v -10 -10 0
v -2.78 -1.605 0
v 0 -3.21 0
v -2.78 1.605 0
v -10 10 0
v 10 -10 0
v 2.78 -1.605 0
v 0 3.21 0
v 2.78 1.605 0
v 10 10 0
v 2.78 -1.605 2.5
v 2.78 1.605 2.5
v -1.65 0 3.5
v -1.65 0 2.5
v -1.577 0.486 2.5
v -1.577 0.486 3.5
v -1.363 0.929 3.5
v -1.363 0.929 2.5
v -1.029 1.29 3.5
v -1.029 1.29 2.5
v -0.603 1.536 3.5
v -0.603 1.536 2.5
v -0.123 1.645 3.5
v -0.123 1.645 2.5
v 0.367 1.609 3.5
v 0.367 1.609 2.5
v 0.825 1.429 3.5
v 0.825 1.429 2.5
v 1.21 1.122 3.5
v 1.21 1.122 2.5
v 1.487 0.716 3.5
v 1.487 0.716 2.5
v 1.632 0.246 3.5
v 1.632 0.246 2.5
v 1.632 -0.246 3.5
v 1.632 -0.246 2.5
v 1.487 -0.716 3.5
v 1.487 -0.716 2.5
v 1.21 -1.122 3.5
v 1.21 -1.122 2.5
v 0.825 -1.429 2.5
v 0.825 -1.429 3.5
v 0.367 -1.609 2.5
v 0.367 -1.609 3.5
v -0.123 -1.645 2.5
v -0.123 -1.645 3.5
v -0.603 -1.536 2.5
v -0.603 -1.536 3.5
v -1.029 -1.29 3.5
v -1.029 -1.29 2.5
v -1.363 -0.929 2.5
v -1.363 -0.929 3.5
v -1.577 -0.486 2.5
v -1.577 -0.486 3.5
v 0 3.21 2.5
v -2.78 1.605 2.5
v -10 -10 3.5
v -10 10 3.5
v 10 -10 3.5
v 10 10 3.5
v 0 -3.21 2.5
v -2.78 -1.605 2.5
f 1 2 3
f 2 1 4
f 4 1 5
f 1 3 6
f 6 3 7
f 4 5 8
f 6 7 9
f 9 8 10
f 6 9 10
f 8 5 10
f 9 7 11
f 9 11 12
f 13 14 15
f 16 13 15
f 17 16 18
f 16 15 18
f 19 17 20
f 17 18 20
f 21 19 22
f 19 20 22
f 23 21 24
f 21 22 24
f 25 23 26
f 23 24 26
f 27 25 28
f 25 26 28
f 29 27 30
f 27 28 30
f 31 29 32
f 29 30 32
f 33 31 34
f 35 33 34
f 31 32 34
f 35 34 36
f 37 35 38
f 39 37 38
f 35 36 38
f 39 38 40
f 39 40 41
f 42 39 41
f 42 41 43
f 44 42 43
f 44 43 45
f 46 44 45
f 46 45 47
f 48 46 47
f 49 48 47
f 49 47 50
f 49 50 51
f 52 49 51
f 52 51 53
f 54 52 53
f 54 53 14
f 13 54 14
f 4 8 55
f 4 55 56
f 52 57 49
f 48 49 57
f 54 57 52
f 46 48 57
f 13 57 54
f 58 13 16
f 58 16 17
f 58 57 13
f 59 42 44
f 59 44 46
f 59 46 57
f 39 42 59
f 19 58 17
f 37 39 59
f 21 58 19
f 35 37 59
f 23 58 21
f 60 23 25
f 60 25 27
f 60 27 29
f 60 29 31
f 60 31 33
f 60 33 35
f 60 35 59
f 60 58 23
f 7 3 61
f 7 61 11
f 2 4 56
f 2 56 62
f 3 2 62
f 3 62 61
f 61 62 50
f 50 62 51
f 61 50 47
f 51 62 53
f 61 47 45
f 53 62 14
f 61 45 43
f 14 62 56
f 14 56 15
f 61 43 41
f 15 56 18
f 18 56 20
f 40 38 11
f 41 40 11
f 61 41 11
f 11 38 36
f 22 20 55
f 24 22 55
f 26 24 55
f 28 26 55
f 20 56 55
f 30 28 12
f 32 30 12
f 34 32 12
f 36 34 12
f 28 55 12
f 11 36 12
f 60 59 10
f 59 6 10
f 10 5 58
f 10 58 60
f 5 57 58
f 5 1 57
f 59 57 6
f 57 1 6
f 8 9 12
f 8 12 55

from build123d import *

# Parameters (mm, degrees)
SKETCH1_W           = 20
SKETCH1_H           = 20
BOSS_EXTRUDE1_DEPTH = 2.5
SKETCH2_W           = 20
SKETCH2_H           = 20
BOSS_EXTRUDE2_DEPTH = 1
SKETCH3_R           = 1.65
CUT_EXTRUDE1_DEPTH  = 4.5


with BuildPart() as part:
    # Sketch1 → Boss-Extrude1 (new body)
    with BuildSketch(Plane.XY):
        Rectangle(SKETCH1_W, SKETCH1_H)
        Polygon((0, -3.210067497), (2.78, -1.605033748), (2.78, 1.605033748), (0, 3.210067497), (-2.78, 1.605033748), (-2.78, -1.605033748), align=None, mode=Mode.SUBTRACT)
    extrude(amount=BOSS_EXTRUDE1_DEPTH)

    # Sketch2 → Boss-Extrude2 (add)
    with BuildSketch(Plane.XY.offset(2.5)):
        Rectangle(SKETCH2_W, SKETCH2_H)
    extrude(amount=BOSS_EXTRUDE2_DEPTH)

    # Sketch3 → Cut-Extrude1 (cut, through all)
    with BuildSketch(Plane(origin=(0, 0, 0), x_dir=(-1, 0, 0), z_dir=(0, 0, -1))):
        Circle(SKETCH3_R)
    extrude(amount=-CUT_EXTRUDE1_DEPTH, mode=Mode.SUBTRACT)


solid = part.part
